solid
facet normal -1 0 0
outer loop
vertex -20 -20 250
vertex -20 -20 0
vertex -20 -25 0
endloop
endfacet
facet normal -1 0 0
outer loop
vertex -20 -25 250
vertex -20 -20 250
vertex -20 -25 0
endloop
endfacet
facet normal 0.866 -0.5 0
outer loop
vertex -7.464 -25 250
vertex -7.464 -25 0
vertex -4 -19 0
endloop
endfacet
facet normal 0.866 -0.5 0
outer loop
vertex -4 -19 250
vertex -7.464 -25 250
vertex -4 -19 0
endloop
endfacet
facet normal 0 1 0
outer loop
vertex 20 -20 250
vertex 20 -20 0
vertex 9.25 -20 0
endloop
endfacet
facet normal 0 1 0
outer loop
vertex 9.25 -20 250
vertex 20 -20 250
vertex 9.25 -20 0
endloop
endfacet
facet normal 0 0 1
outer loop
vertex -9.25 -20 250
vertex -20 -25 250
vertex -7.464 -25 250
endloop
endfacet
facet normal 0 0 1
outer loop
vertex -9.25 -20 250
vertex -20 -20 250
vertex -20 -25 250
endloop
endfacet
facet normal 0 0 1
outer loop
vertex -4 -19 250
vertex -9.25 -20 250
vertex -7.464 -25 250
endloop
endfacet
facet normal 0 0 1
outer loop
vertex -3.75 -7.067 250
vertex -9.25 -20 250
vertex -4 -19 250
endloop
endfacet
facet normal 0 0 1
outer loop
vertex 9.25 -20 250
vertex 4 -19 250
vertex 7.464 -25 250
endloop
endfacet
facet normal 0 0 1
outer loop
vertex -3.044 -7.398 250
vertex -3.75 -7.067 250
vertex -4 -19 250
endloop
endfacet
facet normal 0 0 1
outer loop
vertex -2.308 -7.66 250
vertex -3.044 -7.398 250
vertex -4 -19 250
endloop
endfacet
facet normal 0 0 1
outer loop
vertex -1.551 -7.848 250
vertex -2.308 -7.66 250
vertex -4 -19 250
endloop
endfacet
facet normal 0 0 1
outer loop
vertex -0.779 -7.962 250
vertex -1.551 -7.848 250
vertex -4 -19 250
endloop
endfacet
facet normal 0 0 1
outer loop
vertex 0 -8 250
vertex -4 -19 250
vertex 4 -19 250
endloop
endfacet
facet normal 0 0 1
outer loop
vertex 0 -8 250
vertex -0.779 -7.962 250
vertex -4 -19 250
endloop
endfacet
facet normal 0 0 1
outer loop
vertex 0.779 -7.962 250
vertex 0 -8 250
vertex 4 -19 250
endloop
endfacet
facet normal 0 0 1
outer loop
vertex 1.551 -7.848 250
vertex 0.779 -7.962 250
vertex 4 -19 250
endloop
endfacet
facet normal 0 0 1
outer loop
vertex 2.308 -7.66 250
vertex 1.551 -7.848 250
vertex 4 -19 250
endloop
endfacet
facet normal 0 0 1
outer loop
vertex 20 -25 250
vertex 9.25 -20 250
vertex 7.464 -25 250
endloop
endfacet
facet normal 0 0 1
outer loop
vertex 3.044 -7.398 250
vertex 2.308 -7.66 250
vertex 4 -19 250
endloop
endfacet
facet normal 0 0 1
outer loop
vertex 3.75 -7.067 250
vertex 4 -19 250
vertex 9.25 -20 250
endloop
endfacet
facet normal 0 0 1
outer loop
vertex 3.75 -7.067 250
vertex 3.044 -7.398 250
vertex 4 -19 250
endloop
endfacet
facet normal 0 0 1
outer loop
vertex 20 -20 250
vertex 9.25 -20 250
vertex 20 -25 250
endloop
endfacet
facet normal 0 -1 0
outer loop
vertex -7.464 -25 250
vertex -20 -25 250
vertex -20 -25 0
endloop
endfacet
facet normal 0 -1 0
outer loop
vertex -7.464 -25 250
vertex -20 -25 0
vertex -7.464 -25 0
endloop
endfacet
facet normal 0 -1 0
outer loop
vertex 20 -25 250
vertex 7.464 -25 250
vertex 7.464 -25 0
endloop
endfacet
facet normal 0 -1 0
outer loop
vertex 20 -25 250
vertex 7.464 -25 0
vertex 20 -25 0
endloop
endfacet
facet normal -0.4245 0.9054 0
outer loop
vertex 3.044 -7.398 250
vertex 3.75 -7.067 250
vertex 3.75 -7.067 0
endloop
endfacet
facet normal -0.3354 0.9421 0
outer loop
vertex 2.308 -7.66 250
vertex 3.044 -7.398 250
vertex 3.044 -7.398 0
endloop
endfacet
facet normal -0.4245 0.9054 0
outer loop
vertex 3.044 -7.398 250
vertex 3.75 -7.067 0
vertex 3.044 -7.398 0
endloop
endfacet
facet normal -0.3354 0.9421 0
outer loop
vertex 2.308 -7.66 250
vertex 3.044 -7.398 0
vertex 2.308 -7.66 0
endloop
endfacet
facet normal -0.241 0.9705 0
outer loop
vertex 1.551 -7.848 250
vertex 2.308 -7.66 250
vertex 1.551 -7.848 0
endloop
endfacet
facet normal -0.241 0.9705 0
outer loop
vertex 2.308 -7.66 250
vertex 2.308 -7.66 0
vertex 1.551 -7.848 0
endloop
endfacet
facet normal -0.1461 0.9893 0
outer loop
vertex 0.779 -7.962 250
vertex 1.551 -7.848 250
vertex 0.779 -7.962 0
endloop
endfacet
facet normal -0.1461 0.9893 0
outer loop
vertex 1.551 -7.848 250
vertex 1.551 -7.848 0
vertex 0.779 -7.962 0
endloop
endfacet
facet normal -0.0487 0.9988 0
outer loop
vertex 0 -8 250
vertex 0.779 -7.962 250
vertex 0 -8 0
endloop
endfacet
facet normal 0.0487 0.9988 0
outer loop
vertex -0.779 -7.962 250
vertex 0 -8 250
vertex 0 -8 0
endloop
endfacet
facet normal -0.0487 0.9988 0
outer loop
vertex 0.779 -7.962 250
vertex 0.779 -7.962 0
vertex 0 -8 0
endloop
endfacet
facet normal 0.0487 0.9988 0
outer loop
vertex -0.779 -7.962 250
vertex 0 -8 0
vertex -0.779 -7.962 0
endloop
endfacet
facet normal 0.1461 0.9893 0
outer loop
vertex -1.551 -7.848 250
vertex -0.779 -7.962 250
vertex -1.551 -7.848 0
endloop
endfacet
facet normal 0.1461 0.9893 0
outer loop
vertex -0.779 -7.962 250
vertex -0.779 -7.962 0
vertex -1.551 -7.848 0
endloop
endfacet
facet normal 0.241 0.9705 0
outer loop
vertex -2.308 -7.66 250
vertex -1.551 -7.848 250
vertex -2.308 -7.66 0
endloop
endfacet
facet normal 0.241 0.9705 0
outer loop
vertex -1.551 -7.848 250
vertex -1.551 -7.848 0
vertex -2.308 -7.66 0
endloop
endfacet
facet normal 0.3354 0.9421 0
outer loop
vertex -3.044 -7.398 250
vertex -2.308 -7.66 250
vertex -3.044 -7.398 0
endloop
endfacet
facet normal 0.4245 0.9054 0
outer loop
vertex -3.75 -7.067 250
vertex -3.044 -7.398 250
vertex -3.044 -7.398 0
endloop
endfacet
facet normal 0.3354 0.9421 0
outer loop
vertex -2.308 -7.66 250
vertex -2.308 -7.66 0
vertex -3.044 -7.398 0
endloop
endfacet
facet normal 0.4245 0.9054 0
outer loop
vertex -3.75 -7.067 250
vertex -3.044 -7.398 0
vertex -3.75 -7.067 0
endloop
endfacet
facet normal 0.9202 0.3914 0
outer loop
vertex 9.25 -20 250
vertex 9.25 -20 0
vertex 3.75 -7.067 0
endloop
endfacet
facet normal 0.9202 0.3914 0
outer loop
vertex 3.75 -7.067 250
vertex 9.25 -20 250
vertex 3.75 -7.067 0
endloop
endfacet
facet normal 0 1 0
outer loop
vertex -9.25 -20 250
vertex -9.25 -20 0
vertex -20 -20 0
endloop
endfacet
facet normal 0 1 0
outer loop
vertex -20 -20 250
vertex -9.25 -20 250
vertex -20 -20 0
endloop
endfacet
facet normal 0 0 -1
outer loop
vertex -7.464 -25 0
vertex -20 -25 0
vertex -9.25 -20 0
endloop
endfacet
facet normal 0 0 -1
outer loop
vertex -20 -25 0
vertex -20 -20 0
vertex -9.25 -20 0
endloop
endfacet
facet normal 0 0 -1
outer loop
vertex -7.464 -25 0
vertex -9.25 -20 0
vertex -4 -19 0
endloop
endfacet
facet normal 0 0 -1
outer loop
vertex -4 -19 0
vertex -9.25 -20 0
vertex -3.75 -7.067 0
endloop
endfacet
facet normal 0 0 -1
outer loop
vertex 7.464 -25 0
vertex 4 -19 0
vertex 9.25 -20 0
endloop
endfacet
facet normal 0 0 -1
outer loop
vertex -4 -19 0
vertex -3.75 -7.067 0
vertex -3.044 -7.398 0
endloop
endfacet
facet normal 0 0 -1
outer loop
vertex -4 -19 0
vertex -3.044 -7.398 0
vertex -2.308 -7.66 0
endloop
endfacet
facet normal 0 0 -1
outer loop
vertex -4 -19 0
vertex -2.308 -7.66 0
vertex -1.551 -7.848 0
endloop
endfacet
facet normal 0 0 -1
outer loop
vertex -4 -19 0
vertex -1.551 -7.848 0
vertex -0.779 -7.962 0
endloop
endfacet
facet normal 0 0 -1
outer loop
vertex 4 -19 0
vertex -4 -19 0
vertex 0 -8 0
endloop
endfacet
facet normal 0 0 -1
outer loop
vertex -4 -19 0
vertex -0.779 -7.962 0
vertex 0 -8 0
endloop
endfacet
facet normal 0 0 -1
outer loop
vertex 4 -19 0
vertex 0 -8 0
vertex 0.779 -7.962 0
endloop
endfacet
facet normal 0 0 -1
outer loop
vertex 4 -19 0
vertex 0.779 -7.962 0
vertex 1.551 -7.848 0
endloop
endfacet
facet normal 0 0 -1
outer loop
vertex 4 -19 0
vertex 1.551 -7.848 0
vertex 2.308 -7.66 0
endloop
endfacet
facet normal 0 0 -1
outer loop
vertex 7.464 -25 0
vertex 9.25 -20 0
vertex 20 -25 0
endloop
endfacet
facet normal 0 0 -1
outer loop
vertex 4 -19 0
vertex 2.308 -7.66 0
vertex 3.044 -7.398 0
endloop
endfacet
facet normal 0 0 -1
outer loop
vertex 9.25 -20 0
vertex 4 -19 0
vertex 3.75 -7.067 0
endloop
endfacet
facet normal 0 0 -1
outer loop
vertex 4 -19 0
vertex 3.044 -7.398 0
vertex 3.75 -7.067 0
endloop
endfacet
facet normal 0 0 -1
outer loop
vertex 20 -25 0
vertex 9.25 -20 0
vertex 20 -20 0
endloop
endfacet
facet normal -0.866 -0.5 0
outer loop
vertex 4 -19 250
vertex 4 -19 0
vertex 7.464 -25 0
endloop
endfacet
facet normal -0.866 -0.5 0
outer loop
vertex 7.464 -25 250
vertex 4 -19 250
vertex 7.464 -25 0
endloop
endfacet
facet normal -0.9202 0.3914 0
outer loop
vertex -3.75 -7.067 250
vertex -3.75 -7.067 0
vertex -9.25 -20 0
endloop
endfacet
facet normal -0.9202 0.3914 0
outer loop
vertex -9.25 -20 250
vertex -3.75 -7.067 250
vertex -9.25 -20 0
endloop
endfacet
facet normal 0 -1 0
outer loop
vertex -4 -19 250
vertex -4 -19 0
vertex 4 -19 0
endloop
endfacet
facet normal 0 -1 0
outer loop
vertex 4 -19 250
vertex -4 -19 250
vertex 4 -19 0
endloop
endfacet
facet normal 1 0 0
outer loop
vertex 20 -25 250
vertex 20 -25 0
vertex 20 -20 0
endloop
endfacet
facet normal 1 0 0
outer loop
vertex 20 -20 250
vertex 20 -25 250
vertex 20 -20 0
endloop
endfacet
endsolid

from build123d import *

# Parameters (mm, degrees)
BOSS_EXTRUDE1_DEPTH = 250


with BuildPart() as part:
    # Sketch1 → Boss-Extrude1 (new body)
    with BuildSketch(Plane.XY):
        with BuildLine():
            Line((-20, -25), (-7.464101615, -25))
            Line((-7.464101615, -25), (-4, -19))
            Line((-4, -19), (4, -19))
            Line((4, -19), (7.464101615, -25))
            Line((7.464101615, -25), (20, -25))
            Line((20, -25), (20, -20))
            Line((20, -20), (9.25, -20))
            Line((9.25, -20), (3.75, -7.066647013))
            ThreePointArc((3.75, -7.066647013), (0, -8), (-3.75, -7.066647013))
            Line((-3.75, -7.066647013), (-9.25, -20))
            Line((-9.25, -20), (-20, -20))
            Line((-20, -20), (-20, -25))
        make_face()
    extrude(amount=BOSS_EXTRUDE1_DEPTH)


solid = part.part
